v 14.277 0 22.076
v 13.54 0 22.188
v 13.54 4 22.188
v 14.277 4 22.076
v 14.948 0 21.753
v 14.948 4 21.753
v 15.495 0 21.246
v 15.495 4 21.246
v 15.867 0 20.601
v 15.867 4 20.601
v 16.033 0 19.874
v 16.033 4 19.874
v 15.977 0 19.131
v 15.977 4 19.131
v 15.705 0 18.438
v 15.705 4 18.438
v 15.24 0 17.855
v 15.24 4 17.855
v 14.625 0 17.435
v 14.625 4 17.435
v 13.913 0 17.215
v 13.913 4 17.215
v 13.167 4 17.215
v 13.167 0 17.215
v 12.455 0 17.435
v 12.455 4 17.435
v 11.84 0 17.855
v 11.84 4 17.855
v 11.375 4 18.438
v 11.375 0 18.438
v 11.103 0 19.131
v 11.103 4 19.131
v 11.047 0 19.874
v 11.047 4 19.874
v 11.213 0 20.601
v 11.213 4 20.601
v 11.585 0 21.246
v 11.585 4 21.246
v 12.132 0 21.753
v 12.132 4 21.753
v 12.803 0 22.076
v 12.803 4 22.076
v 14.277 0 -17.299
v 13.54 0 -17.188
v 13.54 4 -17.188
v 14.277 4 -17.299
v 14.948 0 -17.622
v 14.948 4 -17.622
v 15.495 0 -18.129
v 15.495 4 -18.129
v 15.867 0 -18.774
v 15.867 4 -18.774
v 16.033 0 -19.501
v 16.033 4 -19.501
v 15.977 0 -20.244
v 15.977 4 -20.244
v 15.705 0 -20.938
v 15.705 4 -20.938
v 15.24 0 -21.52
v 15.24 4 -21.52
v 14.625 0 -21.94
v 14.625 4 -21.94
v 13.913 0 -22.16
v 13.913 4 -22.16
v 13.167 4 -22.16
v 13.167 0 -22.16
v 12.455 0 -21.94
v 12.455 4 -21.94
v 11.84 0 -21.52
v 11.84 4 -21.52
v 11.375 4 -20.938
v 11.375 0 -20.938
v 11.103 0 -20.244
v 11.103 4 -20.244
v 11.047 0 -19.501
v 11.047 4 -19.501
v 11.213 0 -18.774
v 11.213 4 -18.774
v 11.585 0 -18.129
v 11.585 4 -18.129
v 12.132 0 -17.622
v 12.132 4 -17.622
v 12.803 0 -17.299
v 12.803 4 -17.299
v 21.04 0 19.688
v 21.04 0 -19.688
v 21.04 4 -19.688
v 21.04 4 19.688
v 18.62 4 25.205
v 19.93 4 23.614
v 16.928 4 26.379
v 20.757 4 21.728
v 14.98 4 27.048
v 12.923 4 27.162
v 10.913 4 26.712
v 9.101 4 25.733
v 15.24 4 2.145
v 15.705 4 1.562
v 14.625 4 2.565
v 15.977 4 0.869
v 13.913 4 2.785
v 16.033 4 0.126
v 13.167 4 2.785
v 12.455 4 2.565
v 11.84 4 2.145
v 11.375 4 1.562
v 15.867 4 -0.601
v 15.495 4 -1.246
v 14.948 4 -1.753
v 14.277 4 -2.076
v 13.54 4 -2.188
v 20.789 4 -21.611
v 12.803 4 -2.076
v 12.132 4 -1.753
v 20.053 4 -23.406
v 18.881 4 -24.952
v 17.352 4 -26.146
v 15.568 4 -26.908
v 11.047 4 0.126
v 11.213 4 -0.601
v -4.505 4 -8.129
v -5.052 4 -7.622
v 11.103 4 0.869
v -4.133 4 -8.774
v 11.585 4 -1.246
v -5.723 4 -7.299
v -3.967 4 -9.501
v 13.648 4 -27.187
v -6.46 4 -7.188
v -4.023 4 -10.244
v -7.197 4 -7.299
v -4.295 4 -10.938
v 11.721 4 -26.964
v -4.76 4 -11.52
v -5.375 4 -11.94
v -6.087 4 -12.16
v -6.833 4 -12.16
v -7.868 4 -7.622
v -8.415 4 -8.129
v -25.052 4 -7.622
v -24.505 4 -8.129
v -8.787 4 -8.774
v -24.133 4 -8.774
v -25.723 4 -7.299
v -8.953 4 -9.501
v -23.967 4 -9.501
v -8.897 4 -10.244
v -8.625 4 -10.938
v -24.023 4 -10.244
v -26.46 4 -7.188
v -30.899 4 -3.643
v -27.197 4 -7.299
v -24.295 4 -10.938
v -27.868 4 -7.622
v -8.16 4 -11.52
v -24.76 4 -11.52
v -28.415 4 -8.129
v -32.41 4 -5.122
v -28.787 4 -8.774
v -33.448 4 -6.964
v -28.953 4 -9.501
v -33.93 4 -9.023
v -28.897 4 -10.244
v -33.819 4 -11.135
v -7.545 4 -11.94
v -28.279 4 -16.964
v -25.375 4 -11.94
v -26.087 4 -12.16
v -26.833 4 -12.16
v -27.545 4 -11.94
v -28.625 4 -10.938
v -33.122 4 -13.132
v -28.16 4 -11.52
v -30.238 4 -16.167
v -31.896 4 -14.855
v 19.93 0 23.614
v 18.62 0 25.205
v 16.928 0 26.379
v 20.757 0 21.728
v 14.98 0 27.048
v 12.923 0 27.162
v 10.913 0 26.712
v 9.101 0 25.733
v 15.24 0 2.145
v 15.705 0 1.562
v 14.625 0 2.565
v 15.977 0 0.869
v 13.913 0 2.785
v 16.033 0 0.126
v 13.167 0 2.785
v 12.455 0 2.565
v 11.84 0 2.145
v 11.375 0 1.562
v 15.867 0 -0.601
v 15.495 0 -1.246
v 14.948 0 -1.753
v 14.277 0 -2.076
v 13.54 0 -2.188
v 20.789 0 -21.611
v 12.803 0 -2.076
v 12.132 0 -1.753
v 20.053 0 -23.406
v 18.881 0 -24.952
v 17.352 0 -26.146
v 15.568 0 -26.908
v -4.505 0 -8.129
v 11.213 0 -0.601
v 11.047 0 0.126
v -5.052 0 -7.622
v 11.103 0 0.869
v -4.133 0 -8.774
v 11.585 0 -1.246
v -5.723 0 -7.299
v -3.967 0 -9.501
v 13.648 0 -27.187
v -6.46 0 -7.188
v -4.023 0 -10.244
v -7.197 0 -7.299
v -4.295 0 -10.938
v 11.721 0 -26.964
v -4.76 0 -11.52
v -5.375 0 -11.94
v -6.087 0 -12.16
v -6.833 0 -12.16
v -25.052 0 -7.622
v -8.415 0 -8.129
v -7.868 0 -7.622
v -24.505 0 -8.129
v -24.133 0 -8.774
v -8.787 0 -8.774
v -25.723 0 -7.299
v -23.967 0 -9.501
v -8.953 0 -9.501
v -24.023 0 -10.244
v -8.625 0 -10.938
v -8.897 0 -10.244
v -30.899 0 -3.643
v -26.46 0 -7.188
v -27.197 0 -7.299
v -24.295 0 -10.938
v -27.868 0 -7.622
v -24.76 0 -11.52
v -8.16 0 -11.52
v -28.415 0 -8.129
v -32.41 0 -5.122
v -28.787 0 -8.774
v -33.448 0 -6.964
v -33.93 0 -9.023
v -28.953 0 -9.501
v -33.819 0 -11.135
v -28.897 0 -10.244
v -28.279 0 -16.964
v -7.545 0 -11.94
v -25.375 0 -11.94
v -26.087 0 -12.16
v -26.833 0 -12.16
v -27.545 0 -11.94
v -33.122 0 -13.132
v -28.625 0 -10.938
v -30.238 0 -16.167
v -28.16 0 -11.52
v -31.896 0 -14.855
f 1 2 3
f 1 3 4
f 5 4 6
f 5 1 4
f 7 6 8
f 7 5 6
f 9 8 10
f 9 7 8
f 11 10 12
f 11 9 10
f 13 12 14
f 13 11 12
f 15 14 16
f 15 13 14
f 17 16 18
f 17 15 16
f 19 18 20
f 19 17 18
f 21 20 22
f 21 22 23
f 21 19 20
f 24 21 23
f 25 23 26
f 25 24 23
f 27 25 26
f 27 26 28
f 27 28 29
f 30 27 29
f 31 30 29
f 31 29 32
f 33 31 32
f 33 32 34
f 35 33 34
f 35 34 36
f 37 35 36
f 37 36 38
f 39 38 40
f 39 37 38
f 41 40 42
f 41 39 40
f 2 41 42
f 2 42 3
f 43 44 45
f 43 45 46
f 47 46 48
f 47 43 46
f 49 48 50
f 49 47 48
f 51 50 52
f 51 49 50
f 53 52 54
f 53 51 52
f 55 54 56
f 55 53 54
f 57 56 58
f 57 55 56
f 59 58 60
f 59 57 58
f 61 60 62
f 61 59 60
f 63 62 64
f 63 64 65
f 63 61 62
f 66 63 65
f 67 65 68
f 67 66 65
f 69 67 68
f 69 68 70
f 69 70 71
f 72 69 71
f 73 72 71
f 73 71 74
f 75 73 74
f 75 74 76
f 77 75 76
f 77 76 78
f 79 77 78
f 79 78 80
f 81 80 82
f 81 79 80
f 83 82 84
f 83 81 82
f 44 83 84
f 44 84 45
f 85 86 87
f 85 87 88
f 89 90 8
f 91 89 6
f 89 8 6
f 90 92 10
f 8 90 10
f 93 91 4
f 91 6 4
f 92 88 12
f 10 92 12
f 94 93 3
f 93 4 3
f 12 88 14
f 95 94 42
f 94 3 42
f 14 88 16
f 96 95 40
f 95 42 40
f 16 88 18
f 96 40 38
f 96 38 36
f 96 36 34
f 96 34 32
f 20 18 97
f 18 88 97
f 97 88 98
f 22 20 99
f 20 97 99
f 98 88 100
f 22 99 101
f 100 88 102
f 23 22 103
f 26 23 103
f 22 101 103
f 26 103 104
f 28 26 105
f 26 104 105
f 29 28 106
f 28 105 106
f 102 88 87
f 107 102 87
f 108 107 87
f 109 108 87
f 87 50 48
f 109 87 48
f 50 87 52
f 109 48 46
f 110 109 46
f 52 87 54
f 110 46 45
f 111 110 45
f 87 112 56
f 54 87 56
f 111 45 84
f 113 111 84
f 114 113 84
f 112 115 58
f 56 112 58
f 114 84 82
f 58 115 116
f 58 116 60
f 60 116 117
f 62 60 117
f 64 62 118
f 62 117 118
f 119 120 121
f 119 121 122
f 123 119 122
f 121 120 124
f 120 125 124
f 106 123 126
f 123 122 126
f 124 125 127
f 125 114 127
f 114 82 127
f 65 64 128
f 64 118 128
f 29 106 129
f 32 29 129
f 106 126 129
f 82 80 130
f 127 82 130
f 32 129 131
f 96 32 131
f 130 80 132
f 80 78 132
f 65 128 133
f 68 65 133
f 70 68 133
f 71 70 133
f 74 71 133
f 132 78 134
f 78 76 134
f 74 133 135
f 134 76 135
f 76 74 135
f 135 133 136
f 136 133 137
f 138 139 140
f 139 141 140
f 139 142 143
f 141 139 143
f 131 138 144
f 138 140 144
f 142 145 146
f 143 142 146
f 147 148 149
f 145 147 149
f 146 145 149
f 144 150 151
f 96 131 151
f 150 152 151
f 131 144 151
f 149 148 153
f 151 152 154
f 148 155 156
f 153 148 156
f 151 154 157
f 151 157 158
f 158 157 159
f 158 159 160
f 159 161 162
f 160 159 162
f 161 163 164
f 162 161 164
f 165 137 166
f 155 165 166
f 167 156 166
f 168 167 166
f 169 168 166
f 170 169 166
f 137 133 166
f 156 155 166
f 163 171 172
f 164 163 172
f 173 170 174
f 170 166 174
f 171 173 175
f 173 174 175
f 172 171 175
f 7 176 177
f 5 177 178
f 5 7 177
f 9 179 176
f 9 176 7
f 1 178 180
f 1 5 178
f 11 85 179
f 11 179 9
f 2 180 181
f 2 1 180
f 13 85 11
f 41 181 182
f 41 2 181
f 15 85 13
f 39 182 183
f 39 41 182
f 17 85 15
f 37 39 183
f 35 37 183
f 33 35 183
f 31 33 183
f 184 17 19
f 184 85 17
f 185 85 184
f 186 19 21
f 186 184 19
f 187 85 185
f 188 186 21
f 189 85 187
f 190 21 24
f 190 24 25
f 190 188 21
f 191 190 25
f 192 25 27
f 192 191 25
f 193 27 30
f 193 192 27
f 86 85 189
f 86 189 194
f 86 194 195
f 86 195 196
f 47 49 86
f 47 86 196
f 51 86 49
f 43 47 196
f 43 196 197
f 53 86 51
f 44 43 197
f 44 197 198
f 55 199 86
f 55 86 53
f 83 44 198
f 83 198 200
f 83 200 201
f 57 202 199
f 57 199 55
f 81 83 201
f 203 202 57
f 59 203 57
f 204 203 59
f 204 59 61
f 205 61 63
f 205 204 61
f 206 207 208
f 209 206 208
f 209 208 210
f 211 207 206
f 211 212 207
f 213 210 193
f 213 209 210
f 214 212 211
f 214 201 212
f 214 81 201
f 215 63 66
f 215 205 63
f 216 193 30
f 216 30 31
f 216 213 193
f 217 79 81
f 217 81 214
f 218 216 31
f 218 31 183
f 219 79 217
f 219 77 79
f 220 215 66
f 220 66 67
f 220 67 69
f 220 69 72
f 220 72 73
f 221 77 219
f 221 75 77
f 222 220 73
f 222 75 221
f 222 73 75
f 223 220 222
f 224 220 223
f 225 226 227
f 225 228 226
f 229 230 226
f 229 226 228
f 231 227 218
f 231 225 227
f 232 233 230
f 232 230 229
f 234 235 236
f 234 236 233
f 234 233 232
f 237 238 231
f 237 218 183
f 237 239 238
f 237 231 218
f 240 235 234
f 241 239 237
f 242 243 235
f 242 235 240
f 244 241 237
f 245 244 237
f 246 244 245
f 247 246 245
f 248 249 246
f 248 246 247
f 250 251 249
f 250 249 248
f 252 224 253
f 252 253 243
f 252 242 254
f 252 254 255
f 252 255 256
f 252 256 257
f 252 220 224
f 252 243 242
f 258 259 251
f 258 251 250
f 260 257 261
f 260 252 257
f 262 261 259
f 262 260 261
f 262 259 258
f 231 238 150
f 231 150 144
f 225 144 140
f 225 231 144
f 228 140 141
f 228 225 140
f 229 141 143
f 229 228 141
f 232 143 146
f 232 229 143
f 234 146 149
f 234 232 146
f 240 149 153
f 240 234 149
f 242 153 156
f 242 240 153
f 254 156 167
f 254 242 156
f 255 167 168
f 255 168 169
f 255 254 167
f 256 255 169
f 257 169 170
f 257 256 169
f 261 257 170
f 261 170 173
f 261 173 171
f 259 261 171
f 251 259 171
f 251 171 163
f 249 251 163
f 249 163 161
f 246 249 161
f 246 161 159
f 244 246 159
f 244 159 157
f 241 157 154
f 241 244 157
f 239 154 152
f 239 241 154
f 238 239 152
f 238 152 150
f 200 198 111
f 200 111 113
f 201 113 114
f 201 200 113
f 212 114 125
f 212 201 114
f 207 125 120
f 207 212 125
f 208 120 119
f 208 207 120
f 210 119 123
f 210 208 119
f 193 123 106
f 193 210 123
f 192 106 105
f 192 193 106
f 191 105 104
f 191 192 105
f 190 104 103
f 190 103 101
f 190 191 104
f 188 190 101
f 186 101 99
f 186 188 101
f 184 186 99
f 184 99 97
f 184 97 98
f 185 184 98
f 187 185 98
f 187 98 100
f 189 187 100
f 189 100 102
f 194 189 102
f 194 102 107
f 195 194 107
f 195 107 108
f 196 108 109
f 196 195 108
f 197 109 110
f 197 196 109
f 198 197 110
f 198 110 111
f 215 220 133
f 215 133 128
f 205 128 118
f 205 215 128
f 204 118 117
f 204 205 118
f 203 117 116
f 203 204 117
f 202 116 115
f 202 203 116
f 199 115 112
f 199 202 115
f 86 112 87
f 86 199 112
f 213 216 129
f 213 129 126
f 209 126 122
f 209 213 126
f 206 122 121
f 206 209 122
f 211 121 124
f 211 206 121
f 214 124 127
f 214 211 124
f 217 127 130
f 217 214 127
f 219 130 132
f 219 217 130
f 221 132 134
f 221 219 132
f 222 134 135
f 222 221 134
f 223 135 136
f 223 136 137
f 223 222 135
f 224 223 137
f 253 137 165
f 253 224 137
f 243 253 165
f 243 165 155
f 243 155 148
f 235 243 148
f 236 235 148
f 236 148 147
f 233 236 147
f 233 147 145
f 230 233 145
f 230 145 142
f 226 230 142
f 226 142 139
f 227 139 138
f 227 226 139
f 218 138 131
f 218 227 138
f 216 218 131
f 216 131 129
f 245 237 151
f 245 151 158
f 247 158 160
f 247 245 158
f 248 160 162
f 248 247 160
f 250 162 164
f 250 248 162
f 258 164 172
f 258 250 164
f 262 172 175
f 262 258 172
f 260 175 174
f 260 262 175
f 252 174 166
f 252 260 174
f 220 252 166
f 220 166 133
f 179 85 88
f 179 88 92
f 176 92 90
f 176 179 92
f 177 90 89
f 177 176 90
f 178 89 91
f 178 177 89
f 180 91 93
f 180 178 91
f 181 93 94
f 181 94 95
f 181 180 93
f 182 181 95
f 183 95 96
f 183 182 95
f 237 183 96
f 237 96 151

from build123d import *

# Parameters (mm, degrees)
SKETCH1_R           = 2.5
BOSS_EXTRUDE1_DEPTH = 4


with BuildPart() as part:
    # Sketch1 → Boss-Extrude1 (new body)
    with BuildSketch(Plane(origin=(0, 0, 0), x_dir=(1, 0, 0), z_dir=(0, 1, 0))):
        with BuildLine():
            Line((-28.278974074, 16.963626091), (11.721025926, 26.963626091))
            ThreePointArc((11.721025926, 26.963626091), (18.155634684, 25.599098125), (21.040043114, 19.687557339))
            Line((21.040043114, 19.687557339), (21.040043114, -19.687557339))
            ThreePointArc((21.040043114, -19.687557339), (16.927889481, -26.378782712), (9.100710583, -25.732582292))
            Line((9.100710583, -25.732582292), (-30.899289417, 3.642532387))
            ThreePointArc((-30.899289417, 3.642532387), (-33.81893913, 11.1351002), (-28.278974074, 16.963626091))
        make_face()
        with Locations(Location((-26.459956886, 9.687557339, 0), (0, 0, 270))):
            Circle(SKETCH1_R, mode=Mode.SUBTRACT)
        with Locations(Location((-6.459956886, 9.687557339, 0), (0, 0, 270))):
            Circle(SKETCH1_R, mode=Mode.SUBTRACT)
        with Locations(Location((13.540043114, 19.687557339, 0), (0, 0, 270))):
            Circle(SKETCH1_R, mode=Mode.SUBTRACT)
        with Locations(Location((13.540043114, -0.312442661, 0), (0, 0, 90))):
            Circle(SKETCH1_R, mode=Mode.SUBTRACT)
        with Locations(Location((13.540043114, -19.687557339, 0), (0, 0, 270))):
            Circle(SKETCH1_R, mode=Mode.SUBTRACT)
    extrude(amount=BOSS_EXTRUDE1_DEPTH)


solid = part.part
